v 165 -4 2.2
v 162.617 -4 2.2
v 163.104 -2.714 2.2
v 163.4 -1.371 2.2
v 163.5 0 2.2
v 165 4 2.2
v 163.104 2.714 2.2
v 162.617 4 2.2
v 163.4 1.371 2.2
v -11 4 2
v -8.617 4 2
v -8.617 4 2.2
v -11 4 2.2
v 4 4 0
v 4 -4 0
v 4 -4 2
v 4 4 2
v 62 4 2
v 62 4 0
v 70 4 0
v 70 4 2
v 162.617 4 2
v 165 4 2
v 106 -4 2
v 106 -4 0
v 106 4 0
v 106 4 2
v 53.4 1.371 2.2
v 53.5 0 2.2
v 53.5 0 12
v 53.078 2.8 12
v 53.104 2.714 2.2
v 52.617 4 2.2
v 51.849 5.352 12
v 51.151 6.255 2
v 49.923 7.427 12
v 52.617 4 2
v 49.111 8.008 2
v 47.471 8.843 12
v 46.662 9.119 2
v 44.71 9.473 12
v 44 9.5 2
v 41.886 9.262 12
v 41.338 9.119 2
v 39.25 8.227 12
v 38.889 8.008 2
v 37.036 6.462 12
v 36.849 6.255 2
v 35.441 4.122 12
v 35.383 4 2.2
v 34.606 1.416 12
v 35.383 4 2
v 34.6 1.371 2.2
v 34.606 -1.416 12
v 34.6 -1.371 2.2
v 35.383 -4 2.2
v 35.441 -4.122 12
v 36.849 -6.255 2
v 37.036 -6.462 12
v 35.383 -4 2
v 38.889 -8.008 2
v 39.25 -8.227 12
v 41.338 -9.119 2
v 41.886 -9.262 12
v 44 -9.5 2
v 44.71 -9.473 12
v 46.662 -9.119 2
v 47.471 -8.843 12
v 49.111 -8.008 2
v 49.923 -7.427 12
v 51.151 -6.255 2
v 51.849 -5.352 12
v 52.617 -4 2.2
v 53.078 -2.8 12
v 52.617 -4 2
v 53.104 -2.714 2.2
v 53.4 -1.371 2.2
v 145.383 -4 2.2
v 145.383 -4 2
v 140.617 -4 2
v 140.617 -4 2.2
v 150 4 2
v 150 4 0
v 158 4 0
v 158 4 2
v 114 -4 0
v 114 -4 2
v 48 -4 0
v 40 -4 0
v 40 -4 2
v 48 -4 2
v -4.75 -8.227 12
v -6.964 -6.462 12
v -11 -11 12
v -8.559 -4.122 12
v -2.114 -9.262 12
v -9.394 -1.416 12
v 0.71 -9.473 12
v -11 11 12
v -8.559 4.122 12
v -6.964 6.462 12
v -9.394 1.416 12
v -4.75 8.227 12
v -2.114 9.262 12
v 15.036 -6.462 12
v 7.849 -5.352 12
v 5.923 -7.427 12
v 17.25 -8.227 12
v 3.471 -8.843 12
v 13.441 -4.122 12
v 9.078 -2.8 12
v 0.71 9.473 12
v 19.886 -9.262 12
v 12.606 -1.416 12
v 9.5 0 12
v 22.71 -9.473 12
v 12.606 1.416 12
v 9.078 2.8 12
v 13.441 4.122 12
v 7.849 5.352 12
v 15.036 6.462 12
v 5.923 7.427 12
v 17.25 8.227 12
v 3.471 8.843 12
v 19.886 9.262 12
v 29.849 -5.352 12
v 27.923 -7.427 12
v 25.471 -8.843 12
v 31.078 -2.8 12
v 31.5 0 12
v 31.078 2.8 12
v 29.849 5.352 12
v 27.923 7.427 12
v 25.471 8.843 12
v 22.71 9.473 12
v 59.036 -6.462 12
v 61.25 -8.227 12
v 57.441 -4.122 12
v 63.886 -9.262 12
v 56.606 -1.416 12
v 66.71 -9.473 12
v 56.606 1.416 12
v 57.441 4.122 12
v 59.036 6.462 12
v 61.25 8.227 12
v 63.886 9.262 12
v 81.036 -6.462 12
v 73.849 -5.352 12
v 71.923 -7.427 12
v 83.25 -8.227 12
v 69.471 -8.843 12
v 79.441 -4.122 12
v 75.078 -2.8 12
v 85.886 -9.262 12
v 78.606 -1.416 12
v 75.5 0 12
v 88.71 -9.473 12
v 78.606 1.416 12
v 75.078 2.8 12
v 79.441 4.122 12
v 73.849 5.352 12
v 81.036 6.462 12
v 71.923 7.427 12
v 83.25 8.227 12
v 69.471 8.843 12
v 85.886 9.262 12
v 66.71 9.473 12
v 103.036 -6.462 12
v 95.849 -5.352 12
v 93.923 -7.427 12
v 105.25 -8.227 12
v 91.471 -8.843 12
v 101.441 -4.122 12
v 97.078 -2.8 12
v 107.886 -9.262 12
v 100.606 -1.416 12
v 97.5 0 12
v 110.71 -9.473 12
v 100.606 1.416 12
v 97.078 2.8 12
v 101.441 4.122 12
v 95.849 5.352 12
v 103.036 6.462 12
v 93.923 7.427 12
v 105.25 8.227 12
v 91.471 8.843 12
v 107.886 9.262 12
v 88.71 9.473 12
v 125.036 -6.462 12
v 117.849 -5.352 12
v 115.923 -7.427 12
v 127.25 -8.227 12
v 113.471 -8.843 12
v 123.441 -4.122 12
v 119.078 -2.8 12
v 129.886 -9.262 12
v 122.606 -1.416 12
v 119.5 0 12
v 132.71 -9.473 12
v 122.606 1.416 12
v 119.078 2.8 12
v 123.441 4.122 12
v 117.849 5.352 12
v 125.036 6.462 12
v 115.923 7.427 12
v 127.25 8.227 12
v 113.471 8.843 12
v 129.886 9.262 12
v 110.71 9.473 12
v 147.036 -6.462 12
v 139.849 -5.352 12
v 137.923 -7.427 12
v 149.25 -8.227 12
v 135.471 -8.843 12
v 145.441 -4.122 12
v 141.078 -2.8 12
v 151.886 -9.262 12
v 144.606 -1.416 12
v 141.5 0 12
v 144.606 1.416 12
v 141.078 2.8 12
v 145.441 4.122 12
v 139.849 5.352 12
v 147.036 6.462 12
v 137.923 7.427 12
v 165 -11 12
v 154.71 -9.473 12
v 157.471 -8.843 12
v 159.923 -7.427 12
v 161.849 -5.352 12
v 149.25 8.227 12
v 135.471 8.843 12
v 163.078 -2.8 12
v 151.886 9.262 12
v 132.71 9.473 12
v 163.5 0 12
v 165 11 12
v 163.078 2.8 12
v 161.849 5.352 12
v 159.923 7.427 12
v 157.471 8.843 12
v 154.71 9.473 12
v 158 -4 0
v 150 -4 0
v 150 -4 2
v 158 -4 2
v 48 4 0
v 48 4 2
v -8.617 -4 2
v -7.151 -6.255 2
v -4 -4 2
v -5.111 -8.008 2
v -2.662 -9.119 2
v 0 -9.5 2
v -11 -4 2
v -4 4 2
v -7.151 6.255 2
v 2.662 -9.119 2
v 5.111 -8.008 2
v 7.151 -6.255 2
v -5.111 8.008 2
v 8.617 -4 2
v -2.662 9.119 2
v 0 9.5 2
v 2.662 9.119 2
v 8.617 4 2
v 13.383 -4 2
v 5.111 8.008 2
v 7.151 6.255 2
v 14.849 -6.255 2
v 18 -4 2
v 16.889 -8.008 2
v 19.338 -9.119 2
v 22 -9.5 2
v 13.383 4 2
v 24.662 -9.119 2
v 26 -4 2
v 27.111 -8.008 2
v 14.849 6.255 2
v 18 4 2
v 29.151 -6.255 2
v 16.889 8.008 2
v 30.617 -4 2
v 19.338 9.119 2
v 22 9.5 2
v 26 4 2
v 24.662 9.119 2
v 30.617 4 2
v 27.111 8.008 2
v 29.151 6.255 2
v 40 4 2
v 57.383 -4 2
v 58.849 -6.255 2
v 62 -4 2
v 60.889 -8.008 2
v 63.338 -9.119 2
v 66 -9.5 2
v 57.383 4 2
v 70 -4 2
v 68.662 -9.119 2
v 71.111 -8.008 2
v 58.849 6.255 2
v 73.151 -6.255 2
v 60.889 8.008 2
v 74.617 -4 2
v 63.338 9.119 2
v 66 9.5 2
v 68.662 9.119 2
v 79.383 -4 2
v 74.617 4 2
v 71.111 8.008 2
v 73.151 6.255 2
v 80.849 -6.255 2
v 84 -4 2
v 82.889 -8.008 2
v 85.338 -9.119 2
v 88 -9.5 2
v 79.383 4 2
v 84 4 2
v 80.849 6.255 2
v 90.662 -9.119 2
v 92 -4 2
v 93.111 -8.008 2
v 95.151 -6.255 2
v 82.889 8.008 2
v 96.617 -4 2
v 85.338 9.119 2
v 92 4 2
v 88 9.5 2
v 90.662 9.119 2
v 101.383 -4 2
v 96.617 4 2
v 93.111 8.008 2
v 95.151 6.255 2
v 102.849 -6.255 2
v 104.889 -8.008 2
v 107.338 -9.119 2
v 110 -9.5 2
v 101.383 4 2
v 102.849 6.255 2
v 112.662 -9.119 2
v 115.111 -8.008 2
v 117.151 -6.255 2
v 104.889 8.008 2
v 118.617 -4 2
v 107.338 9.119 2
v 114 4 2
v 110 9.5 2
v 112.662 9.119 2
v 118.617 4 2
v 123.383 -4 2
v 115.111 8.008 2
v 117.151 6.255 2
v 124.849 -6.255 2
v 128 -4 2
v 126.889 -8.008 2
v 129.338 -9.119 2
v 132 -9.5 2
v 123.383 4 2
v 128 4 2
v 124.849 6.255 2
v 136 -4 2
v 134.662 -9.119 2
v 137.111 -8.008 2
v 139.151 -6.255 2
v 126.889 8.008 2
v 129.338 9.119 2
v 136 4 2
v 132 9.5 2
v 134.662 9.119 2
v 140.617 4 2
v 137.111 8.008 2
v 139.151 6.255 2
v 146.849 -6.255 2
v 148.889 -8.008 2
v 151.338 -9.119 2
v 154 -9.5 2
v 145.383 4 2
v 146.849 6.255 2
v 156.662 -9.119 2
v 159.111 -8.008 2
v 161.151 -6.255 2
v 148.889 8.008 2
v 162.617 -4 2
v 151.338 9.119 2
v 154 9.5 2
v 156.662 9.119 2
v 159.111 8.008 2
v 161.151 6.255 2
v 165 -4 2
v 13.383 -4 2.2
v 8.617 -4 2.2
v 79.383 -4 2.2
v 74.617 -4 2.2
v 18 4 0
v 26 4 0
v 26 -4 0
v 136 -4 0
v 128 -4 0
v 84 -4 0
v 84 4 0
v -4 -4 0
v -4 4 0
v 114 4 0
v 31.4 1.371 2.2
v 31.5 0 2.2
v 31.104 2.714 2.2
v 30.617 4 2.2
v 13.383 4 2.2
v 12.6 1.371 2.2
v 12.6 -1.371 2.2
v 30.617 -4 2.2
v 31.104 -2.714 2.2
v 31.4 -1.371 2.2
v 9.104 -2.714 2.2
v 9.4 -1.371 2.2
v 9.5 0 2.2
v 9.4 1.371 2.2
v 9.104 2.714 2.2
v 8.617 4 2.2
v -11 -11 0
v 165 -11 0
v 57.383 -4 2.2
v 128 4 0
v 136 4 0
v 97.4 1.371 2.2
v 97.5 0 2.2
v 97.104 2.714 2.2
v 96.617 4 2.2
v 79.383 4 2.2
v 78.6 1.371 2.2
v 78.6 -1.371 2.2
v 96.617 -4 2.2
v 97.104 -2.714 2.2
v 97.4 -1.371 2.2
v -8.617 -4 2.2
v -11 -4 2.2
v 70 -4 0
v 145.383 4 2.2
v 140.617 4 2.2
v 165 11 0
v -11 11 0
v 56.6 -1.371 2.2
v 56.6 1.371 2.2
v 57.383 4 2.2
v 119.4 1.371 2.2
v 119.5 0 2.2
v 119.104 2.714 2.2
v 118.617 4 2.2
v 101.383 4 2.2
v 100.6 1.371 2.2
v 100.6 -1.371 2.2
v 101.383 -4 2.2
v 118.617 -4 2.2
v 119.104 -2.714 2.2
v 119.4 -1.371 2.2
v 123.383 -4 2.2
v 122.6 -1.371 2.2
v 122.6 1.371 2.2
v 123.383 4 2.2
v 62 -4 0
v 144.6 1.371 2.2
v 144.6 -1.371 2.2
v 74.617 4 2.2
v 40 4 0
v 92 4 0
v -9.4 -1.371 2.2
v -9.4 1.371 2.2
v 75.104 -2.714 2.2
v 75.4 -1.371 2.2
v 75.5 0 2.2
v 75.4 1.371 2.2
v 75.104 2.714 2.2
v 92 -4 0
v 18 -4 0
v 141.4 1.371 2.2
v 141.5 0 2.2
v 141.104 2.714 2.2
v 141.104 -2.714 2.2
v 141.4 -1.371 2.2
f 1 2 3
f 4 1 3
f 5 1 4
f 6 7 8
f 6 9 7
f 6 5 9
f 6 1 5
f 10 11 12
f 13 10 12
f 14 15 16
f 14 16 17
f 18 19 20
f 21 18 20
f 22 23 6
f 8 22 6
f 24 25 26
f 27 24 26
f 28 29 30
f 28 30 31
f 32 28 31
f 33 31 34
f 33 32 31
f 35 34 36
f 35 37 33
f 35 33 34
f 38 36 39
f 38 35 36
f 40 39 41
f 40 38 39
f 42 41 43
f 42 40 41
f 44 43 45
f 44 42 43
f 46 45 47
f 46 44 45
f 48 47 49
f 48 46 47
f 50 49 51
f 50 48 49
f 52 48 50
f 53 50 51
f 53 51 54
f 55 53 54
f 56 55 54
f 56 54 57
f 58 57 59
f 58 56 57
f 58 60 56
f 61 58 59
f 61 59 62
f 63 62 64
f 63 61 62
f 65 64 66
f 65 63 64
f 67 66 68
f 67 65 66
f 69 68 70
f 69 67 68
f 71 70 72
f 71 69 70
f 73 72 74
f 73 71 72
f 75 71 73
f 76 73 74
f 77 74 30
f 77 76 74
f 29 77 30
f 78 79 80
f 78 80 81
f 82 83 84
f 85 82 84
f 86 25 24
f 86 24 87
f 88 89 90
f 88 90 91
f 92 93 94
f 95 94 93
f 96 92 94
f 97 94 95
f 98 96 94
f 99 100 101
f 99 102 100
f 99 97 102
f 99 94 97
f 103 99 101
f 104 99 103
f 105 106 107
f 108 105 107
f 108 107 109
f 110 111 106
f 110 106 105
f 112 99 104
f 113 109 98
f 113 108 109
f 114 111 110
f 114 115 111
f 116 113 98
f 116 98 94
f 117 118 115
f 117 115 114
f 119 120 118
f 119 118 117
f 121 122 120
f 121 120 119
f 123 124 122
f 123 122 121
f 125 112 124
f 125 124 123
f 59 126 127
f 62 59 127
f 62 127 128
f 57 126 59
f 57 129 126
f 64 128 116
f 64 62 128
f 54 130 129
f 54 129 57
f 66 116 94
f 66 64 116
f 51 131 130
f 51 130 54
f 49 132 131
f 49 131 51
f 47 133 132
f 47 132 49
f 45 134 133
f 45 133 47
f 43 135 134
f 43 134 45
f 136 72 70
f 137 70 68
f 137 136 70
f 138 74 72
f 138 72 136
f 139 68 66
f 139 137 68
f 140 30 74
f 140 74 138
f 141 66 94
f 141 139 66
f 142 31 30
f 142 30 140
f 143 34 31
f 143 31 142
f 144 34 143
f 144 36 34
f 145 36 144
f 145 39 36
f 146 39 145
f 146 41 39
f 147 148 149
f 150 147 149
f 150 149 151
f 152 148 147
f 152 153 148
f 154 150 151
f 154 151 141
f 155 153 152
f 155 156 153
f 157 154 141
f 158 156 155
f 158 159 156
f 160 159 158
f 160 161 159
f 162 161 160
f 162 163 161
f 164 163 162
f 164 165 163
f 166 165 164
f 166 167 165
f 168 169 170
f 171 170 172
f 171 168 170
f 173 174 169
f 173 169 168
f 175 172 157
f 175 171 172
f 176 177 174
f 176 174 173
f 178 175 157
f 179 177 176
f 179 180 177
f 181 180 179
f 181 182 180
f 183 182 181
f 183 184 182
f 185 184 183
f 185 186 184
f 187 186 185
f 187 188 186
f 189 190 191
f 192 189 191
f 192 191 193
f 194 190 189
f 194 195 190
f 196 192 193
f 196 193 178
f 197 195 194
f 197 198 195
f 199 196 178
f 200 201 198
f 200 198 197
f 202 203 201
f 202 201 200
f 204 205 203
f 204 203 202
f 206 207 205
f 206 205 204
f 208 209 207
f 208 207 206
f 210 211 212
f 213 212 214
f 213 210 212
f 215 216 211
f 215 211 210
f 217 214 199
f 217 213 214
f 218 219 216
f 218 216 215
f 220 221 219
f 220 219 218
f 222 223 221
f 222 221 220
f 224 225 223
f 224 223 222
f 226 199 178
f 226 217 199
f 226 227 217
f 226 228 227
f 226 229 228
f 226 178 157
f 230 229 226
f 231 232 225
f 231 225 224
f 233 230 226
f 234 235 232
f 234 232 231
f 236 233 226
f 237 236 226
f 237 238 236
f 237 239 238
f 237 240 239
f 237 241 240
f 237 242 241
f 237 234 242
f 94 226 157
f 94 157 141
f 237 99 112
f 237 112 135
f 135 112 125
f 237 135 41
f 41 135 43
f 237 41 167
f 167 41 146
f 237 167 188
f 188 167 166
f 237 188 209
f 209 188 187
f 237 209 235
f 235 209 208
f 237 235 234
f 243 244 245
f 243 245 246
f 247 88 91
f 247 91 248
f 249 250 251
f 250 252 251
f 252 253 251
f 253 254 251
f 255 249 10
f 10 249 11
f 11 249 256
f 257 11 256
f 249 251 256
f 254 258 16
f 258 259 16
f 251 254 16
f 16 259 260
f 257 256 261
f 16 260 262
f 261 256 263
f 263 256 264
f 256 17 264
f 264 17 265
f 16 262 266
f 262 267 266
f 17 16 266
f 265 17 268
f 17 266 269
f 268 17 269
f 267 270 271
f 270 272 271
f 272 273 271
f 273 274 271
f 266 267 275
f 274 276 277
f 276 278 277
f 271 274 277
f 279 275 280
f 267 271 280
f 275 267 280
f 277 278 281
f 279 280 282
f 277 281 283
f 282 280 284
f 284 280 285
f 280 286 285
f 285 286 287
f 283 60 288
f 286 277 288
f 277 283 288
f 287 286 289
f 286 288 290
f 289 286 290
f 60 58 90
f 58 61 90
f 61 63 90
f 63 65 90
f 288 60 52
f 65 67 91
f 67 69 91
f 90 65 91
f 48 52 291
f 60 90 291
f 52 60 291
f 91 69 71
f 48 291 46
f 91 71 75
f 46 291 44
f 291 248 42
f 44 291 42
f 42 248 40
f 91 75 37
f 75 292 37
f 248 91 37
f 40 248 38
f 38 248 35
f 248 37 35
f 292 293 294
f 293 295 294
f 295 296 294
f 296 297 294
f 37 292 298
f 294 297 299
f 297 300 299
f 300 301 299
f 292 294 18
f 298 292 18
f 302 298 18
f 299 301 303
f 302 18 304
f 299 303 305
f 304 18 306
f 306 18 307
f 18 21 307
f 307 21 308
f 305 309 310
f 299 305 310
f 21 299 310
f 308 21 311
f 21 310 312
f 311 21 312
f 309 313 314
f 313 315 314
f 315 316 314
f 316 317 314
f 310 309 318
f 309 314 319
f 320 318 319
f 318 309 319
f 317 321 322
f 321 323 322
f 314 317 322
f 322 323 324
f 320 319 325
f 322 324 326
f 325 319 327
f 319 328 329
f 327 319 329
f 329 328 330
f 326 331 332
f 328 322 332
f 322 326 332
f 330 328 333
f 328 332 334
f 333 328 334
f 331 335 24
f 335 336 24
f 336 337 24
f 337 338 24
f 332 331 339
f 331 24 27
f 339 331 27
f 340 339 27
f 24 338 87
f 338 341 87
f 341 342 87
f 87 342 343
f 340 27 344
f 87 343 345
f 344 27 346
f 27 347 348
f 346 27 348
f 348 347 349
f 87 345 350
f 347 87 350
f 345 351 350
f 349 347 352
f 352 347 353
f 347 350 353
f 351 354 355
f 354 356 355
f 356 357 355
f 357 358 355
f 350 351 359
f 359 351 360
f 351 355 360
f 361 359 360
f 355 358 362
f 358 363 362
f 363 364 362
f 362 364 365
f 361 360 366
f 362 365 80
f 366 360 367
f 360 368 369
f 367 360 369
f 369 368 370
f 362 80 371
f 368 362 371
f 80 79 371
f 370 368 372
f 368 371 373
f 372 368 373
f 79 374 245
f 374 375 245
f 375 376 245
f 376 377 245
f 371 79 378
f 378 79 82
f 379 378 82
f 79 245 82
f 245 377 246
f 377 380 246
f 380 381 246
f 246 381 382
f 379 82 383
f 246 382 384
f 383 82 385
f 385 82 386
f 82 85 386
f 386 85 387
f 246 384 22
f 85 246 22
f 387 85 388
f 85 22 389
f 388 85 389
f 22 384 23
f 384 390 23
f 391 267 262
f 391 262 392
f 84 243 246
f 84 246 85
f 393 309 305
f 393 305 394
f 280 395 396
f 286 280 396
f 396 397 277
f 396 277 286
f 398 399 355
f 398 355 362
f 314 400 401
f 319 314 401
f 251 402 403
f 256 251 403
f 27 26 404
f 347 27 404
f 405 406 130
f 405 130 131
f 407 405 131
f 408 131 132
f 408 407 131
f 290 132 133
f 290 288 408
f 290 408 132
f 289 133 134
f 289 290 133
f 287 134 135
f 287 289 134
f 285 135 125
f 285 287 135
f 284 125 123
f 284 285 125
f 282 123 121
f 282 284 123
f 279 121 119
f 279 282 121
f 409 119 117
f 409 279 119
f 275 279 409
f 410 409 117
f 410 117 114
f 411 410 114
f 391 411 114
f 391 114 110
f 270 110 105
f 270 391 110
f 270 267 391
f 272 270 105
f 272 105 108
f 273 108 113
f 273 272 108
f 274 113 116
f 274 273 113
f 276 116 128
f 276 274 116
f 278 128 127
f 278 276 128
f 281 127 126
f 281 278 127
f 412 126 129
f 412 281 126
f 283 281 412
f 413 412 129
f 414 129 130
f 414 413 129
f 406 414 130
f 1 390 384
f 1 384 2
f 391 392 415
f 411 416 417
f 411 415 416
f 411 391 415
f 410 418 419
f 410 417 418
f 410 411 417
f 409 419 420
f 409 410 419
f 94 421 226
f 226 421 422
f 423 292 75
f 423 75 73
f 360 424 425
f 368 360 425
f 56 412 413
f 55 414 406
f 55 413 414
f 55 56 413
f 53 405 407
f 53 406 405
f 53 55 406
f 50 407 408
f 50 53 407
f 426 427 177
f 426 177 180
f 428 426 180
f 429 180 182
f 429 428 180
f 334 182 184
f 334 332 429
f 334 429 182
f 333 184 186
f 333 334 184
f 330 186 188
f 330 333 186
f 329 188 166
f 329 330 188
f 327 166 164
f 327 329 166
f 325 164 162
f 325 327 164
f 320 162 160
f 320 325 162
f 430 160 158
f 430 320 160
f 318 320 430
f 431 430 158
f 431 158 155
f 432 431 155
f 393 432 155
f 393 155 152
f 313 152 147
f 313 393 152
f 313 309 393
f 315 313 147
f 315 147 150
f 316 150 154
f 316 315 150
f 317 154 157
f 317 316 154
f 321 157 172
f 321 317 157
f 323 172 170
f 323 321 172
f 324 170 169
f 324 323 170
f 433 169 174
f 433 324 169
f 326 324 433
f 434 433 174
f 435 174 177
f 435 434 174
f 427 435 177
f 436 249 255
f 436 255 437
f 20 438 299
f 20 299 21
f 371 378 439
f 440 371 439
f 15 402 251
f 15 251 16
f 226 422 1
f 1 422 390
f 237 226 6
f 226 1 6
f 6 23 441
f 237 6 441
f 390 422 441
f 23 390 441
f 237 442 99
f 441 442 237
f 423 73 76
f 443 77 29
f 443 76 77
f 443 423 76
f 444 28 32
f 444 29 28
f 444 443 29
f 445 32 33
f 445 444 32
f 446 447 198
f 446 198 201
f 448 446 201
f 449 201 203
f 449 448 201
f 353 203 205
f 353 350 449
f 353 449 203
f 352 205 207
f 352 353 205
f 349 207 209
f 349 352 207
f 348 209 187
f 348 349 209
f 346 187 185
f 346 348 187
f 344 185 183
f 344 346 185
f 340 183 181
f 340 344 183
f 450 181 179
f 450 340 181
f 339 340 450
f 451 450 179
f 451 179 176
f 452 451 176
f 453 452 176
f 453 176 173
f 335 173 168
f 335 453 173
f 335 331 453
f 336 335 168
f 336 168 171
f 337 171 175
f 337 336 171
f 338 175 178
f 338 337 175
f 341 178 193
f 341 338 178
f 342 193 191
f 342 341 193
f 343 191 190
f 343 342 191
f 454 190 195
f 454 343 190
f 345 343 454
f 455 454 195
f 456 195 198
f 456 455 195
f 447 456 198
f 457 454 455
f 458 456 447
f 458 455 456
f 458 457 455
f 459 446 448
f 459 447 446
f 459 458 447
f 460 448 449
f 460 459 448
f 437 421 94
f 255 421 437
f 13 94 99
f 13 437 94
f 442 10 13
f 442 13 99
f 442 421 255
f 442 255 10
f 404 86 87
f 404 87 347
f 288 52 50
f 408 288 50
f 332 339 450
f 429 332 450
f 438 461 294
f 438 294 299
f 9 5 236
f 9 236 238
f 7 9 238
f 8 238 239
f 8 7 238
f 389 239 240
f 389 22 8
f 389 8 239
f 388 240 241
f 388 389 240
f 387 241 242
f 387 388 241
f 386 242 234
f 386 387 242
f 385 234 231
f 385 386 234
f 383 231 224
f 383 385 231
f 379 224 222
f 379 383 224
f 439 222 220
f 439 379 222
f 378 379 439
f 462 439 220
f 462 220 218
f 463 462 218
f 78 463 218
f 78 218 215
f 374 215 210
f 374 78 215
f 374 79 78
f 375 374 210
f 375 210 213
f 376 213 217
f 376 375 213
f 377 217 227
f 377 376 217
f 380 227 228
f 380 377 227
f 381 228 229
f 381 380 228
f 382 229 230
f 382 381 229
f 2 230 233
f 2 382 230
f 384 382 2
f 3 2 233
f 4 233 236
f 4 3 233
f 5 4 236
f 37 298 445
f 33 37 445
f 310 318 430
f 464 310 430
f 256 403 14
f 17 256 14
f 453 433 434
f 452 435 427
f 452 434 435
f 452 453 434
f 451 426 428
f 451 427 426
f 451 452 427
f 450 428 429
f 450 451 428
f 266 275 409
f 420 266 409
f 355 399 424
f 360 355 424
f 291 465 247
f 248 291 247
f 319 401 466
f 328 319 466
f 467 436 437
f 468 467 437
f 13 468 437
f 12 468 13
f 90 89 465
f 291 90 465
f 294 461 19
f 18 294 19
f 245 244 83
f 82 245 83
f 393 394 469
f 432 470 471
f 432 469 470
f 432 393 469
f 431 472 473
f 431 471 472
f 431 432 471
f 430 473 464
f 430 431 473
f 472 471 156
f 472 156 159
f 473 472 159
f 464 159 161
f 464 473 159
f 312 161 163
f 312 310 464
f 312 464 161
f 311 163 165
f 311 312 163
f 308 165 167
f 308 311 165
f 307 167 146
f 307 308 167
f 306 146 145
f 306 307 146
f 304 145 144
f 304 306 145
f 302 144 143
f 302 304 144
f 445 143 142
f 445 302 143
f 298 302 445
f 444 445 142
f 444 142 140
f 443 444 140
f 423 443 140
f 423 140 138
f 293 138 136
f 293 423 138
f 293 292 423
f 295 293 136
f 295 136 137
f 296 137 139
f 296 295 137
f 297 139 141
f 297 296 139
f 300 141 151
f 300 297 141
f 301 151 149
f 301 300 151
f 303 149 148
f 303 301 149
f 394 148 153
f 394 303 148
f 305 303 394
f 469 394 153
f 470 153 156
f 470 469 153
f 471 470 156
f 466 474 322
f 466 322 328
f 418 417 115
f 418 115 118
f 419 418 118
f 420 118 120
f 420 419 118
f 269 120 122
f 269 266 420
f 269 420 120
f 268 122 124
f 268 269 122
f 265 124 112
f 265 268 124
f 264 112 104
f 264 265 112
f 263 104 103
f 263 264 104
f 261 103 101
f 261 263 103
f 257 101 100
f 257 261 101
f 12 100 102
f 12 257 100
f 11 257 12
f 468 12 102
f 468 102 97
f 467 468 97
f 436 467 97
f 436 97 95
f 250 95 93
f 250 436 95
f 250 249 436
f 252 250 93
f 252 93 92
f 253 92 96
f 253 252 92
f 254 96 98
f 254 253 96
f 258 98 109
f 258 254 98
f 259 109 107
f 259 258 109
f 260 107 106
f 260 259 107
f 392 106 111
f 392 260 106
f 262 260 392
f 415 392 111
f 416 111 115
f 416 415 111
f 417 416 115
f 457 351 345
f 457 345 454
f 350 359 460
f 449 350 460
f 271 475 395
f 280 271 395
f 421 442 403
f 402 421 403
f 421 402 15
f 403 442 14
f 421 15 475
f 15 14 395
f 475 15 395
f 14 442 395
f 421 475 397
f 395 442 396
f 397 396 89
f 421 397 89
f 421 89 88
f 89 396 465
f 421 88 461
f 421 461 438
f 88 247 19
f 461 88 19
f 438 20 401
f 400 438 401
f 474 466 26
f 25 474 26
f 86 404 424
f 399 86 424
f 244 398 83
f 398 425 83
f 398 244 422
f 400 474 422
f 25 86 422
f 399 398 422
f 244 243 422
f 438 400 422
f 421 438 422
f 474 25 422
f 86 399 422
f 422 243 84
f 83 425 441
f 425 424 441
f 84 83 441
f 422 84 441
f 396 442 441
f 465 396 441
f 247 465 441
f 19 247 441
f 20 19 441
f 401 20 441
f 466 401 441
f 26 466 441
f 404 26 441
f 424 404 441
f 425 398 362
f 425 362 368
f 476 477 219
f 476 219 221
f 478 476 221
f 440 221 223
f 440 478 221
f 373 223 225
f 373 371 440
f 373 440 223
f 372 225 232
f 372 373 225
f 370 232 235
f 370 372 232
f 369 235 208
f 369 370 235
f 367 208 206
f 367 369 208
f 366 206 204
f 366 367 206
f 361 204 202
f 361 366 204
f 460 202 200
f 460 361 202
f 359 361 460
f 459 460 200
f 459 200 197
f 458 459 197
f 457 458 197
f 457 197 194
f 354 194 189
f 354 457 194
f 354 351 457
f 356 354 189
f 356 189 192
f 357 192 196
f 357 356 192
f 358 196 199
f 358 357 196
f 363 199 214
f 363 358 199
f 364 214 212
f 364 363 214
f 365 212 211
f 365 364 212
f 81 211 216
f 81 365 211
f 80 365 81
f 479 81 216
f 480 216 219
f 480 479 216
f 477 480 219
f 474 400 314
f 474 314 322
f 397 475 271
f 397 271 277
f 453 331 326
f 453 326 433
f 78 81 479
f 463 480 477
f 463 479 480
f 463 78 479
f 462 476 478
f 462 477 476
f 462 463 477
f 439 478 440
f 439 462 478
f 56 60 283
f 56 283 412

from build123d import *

# Parameters (mm, degrees)
F0_W     = 22
F0_H     = 22
F0_W_2   = 8
F0_H_2   = 8
F1_DEPTH = 2
F2_W     = 176
F2_H     = 22
F2_R     = 9.5
F3_DEPTH = 10
F4_W     = 8
F4_H     = 0.2
F5_DEPTH = 176.001


with BuildPart() as f1:
    # F0 (on Top) → F1 (new body)
    with BuildSketch(Plane.XY):
        Rectangle(F0_W, F0_H)
        Rectangle(F0_W_2, F0_H_2, mode=Mode.SUBTRACT)
        with Locations((22, 0)):
            Rectangle(F0_W, F0_H)
        with Locations((22, 0)):
            Rectangle(F0_W_2, F0_H_2, mode=Mode.SUBTRACT)
        with Locations((44, 0)):
            Rectangle(F0_W, F0_H)
        with Locations((44, 0)):
            Rectangle(F0_W_2, F0_H_2, mode=Mode.SUBTRACT)
        with Locations((66, 0)):
            Rectangle(F0_W, F0_H)
        with Locations((66, 0)):
            Rectangle(F0_W_2, F0_H_2, mode=Mode.SUBTRACT)
        with Locations((88, 0)):
            Rectangle(F0_W, F0_H)
        with Locations((88, 0)):
            Rectangle(F0_W_2, F0_H_2, mode=Mode.SUBTRACT)
        with Locations((110, 0)):
            Rectangle(F0_W, F0_H)
        with Locations((110, 0)):
            Rectangle(F0_W_2, F0_H_2, mode=Mode.SUBTRACT)
        with Locations((132, 0)):
            Rectangle(F0_W, F0_H)
        with Locations((132, 0)):
            Rectangle(F0_W_2, F0_H_2, mode=Mode.SUBTRACT)
        with Locations((154, 0)):
            Rectangle(F0_W, F0_H)
        with Locations((154, 0)):
            Rectangle(F0_W_2, F0_H_2, mode=Mode.SUBTRACT)
    extrude(amount=F1_DEPTH)

    # F2 (on face) → F3 (join)
    with BuildSketch(Plane.XY.offset(2)):
        with Locations((77, 0)):
            Rectangle(F2_W, F2_H)
        Circle(F2_R, mode=Mode.SUBTRACT)
        with Locations((22, 0)):
            Circle(F2_R, mode=Mode.SUBTRACT)
        with Locations((44, 0)):
            Circle(F2_R, mode=Mode.SUBTRACT)
        with Locations((66, 0)):
            Circle(F2_R, mode=Mode.SUBTRACT)
        with Locations((88, 0)):
            Circle(F2_R, mode=Mode.SUBTRACT)
        with Locations((110, 0)):
            Circle(F2_R, mode=Mode.SUBTRACT)
        with Locations((132, 0)):
            Circle(F2_R, mode=Mode.SUBTRACT)
        with Locations((154, 0)):
            Circle(F2_R, mode=Mode.SUBTRACT)
    extrude(amount=F3_DEPTH)

    # F4 (on face) → F5 (cut, through all)
    with BuildSketch(Plane.YZ.offset(165)):
        with Locations((0, 2.1)):
            Rectangle(F4_W, F4_H)
    extrude(amount=-F5_DEPTH, mode=Mode.SUBTRACT)


solid = f1.part
